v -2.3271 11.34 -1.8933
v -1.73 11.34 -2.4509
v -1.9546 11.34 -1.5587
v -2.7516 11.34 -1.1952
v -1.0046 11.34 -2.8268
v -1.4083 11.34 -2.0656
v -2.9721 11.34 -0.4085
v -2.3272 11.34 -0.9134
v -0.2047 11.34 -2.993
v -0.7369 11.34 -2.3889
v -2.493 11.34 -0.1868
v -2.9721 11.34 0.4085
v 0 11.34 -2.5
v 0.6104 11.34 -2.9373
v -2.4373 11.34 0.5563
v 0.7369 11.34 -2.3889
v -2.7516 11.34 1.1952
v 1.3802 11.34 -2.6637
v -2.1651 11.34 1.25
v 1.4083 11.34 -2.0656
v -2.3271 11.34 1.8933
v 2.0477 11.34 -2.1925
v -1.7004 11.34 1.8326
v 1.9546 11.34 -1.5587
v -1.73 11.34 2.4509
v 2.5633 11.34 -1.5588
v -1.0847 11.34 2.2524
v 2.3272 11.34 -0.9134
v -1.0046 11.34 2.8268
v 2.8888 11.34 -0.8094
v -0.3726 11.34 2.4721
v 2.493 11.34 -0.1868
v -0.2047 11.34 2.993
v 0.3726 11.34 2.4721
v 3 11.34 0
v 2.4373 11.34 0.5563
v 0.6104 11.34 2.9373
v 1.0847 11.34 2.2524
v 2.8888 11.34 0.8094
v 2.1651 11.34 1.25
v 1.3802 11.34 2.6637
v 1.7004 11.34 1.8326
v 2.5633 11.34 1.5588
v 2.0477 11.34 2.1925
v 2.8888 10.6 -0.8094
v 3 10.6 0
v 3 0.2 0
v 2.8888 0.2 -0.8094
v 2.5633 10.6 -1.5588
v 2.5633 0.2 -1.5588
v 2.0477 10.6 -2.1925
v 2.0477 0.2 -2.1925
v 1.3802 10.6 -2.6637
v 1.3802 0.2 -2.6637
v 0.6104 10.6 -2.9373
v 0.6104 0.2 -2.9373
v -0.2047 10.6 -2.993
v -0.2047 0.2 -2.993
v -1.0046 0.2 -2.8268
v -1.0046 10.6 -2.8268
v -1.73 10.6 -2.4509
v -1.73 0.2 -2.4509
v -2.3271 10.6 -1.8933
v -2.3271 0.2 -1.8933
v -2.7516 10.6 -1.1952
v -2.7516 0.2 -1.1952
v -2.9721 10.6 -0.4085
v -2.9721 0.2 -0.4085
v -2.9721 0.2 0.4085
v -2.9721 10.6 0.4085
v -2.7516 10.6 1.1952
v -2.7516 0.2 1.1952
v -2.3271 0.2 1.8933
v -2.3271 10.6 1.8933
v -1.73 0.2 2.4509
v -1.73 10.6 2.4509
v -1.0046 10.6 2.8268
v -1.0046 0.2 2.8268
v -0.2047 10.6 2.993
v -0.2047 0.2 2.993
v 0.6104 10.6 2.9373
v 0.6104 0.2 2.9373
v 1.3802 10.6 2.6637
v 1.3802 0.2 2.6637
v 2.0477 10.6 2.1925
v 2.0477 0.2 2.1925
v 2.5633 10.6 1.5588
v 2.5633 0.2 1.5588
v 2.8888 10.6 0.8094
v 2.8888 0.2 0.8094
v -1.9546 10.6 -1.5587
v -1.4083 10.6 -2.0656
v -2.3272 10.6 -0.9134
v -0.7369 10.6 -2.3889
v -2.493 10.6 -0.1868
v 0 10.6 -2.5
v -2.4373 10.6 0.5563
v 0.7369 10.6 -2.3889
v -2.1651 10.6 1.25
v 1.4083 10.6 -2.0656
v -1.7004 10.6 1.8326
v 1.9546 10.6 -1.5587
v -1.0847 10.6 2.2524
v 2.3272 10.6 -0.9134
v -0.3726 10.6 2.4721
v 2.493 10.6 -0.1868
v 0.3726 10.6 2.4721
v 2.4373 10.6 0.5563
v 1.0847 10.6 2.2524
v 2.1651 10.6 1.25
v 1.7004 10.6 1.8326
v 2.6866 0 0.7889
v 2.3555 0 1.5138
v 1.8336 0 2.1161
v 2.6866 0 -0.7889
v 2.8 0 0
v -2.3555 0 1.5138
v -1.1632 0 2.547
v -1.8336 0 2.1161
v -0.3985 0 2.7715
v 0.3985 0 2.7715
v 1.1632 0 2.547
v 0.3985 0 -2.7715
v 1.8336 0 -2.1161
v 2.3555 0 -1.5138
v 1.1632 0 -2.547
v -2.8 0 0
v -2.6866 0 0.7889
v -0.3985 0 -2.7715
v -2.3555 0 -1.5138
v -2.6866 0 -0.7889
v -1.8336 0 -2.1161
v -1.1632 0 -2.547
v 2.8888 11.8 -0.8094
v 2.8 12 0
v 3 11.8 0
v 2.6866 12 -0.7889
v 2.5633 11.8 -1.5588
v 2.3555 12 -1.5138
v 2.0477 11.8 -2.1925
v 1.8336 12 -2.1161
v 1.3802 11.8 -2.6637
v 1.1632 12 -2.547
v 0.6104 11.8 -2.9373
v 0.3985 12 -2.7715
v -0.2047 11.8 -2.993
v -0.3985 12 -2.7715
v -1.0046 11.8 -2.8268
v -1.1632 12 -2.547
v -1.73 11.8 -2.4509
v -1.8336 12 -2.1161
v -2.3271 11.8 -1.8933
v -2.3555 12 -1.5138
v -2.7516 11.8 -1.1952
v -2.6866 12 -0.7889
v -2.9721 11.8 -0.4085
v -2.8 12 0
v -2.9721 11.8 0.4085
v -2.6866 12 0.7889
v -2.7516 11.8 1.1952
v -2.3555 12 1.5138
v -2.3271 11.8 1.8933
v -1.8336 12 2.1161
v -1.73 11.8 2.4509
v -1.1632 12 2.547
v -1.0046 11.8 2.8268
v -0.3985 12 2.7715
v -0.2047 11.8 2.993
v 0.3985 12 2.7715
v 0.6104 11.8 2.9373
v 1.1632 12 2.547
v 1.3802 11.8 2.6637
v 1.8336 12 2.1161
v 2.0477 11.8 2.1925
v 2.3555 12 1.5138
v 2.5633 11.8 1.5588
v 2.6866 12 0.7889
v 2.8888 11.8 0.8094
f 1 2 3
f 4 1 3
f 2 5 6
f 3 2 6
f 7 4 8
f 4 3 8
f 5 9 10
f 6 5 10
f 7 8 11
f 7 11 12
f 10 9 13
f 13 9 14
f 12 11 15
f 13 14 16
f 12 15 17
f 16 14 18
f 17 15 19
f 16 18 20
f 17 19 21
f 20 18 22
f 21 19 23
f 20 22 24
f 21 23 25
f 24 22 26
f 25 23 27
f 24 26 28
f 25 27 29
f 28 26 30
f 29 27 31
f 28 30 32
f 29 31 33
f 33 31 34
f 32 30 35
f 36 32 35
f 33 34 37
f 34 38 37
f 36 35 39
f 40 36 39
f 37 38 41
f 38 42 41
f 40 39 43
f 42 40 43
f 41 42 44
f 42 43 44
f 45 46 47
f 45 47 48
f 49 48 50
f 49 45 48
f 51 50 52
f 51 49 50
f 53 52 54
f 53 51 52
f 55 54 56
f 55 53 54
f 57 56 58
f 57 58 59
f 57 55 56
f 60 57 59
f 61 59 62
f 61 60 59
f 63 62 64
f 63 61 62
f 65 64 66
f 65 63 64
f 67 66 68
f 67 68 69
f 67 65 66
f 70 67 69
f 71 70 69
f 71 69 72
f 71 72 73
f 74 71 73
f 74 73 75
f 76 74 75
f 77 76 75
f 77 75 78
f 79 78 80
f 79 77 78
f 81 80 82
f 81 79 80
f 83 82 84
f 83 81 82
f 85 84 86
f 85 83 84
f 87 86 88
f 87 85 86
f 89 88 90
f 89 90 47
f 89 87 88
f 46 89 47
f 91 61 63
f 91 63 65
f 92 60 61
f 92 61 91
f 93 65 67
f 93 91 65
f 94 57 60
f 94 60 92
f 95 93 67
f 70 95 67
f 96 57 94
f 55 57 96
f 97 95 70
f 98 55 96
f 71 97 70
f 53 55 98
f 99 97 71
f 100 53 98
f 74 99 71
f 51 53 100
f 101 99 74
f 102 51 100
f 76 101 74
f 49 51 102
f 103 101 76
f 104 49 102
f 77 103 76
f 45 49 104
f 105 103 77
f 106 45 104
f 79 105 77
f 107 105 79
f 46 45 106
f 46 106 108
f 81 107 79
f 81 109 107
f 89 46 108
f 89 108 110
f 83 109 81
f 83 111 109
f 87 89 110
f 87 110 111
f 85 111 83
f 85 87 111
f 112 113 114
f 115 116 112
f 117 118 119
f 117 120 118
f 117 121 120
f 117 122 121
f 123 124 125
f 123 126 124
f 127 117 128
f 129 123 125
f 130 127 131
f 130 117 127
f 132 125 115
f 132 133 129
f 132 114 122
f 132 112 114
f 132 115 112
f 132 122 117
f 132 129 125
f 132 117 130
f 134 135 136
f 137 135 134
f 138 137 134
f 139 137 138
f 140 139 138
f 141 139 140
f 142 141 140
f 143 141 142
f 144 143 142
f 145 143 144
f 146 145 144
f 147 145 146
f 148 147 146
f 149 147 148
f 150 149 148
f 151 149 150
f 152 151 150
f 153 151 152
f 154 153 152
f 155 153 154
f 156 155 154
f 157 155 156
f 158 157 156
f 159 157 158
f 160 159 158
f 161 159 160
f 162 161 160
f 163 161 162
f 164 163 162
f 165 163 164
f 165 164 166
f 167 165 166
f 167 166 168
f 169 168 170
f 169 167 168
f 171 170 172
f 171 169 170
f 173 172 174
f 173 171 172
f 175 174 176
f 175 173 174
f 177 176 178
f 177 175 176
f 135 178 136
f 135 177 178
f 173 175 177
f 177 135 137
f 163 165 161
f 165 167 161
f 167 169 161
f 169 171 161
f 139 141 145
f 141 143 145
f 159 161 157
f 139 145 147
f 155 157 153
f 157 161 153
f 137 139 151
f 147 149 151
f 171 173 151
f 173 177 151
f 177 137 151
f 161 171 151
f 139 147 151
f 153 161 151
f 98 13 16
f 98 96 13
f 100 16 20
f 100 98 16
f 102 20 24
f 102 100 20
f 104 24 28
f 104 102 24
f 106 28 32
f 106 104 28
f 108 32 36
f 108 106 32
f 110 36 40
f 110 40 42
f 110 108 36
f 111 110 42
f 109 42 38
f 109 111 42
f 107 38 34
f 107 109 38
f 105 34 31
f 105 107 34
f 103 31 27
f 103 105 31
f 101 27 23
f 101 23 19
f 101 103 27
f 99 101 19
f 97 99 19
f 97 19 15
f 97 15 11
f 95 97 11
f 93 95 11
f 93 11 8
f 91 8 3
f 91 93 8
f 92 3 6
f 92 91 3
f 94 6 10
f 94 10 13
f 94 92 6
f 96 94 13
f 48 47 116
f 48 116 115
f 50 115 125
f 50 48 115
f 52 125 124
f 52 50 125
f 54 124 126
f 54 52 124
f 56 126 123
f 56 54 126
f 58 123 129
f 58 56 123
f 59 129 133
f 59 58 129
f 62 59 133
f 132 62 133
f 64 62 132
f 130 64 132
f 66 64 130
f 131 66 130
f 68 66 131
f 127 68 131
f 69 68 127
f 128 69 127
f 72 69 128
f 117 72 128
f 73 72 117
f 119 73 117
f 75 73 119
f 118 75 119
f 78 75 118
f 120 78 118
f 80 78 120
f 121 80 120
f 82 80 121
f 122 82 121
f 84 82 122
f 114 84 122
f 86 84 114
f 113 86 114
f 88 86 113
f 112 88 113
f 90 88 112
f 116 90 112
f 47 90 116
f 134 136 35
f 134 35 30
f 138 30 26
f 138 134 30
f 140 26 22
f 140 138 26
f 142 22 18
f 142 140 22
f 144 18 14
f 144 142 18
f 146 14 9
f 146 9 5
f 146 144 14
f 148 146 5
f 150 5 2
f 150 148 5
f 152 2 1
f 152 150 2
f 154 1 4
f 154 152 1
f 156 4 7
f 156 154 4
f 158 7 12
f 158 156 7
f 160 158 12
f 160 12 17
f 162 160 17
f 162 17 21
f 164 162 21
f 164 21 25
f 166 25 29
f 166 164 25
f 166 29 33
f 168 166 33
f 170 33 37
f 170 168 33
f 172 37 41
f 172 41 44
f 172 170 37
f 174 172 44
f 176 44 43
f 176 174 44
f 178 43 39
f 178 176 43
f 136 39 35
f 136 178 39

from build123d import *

# Parameters (mm, degrees)
SKETCH1_W       = 3
SKETCH1_H       = 12
SKETCH5_W       = 2.05
SKETCH5_H       = 0.74
CHANFREIN1_SIZE = 0.2


with BuildPart() as part:
    # Sketch1 → Revolve1 (revolve)
    with BuildSketch(Plane.XY):
        with Locations((1.5, 6)):
            Rectangle(SKETCH1_W, SKETCH1_H)
    revolve(axis=Axis((0, 0, 0), (0, 1, 0)))

    # Sketch5 → Groove for DIN 471 - 4 x 0.4, Circlip for shafts - normal1 (revolve, cut)
    with BuildSketch(Plane(origin=(0, 0, 0), x_dir=(0, 0, -1), z_dir=(-1, 0, 0))):
        with Locations((3.525, -10.97)):
            Rectangle(SKETCH5_W, SKETCH5_H)
    revolve(axis=Axis((0, 50.028808754, 0), (0, -1, 0)), mode=Mode.SUBTRACT)

    # Chanfrein1
    chanfrein1_edges = [part.edges().sort_by_distance(p)[0] for p in [
        (-3, 0, 0),
        (-3, 12, 0),
    ]]
    chamfer(chanfrein1_edges, length=CHANFREIN1_SIZE)


solid = part.part
